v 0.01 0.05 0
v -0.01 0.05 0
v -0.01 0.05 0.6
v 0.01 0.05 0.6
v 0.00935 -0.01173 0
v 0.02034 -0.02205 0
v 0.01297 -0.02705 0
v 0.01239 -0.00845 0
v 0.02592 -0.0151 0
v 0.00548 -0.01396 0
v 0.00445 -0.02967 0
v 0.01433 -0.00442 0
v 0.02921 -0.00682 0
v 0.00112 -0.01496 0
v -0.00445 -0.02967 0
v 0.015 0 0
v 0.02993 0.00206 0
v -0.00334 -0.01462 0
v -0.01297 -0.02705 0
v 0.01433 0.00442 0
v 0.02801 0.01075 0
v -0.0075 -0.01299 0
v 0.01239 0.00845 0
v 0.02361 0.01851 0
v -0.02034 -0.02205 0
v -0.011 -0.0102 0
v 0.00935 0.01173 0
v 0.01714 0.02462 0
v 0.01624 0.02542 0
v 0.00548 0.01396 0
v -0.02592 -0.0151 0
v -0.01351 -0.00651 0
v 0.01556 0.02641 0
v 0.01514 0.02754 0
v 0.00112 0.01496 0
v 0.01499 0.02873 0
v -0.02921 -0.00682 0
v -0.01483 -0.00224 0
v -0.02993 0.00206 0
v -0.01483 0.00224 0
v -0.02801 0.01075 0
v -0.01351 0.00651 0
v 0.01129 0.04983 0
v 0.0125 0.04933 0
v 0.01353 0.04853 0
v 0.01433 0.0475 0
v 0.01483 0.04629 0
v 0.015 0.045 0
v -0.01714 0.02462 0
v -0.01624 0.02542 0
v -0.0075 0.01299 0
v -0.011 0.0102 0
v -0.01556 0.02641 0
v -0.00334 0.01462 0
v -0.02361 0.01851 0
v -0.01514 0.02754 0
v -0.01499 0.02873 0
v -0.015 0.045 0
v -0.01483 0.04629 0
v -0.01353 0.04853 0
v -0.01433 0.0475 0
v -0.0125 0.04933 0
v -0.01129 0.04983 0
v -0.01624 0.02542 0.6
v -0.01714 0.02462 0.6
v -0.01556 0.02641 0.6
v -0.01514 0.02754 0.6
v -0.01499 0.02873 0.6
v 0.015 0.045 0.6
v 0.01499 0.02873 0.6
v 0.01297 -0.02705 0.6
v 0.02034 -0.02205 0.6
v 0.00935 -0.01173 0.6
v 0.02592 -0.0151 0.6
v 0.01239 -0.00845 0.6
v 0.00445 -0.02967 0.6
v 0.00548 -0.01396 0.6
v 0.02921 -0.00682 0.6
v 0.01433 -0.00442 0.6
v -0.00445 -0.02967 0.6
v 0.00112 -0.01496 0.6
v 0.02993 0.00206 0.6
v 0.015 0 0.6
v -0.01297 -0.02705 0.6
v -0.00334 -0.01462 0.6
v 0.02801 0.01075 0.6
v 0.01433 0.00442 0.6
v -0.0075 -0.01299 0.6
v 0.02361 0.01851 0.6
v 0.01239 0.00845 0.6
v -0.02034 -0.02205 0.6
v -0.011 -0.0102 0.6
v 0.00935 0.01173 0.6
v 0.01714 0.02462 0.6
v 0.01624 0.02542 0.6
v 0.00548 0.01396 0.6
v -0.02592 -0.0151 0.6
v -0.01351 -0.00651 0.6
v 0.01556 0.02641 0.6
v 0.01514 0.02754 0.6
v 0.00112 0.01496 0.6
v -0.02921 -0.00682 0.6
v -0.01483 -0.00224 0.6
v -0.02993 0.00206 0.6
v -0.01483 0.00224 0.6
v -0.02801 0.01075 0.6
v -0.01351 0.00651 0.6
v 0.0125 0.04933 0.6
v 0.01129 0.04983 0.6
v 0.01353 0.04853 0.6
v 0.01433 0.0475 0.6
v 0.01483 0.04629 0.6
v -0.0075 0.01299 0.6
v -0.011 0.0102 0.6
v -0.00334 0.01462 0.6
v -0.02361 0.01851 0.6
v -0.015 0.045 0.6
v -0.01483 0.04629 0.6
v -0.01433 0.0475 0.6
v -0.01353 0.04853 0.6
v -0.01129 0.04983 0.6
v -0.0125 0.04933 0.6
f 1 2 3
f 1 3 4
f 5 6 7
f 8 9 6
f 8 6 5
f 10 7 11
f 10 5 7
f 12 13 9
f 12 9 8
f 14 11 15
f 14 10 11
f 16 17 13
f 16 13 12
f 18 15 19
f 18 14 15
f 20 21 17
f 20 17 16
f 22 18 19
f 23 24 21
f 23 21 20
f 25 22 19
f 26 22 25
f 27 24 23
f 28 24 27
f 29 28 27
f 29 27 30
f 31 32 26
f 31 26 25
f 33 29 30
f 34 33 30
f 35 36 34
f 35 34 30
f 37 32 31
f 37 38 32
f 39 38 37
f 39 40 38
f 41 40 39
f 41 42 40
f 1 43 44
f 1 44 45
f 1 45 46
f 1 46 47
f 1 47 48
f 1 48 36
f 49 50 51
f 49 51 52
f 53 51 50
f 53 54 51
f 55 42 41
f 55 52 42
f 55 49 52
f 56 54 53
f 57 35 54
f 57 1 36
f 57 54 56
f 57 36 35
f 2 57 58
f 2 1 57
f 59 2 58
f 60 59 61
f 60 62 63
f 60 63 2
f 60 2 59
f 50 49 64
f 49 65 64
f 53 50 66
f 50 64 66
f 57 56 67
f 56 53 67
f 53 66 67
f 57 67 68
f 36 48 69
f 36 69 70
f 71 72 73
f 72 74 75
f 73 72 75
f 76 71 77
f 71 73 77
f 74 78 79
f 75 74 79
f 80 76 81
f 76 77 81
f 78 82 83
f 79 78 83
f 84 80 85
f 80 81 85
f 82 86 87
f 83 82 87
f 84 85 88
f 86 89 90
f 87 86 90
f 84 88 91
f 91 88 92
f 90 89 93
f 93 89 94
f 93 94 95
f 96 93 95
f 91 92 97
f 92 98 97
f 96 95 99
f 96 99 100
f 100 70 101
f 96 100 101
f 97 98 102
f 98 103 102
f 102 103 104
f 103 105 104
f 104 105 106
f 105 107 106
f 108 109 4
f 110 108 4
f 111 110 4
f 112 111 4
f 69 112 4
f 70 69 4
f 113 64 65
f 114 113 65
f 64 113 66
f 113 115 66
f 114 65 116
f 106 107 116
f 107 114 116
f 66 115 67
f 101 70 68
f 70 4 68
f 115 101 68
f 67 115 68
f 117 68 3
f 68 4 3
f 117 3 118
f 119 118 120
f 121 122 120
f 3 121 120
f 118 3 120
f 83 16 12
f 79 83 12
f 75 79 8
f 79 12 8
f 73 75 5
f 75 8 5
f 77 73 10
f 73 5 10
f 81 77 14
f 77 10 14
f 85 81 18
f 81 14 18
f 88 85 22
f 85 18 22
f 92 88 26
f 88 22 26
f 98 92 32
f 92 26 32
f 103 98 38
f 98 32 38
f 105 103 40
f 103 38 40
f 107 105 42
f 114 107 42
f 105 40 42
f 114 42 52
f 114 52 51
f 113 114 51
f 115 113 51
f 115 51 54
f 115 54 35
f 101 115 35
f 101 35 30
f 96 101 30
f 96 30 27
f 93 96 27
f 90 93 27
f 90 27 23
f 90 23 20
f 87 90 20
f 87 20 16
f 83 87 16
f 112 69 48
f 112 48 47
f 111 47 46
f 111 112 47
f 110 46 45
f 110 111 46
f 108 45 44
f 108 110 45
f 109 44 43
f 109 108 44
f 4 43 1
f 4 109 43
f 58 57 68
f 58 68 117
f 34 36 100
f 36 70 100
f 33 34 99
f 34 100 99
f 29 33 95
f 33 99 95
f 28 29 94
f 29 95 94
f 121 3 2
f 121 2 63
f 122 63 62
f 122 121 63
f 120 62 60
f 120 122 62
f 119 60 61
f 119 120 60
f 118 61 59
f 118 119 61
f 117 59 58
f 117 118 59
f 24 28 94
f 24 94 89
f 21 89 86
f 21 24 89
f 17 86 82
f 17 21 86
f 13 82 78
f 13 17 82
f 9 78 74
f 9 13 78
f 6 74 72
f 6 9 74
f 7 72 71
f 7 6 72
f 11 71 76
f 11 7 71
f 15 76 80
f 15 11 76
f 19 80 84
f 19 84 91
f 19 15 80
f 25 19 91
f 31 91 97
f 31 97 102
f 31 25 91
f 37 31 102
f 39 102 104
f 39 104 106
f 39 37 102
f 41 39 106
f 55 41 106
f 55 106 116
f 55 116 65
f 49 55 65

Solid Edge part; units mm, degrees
sketch "Sketch1" plane through (0, 0, 0) normal (0, 0, 1) x (1, 0, 0)
  line L0 (-0.015, 0.026) -> (-0.015, 0.05)
  line L1 (-0.015, 0.05) -> (0.015, 0.05)
  line L2 (0.015, 0.05) -> (0.015, 0.026)
  arc A0 (0.015, 0.026) -> (-0.015, 0.026) centre (0, 0) cw
  dimension "D1" = 0.015
extrude "Protrusion1" add sketch "Sketch1" along normal blind 0.6
sketch "Sketch2" plane through (0, 0, 0) normal (0, 0, 1) x (1, 0, 0)
  circle A0 centre (0, 0) radius 0.015
  dimension "D1" = 0.03
extrude "Cutout1" cut sketch "Sketch2" along normal through all
fillet "Verrundung_1" radius 0.005 4 edges at (0.015, 0.026, 0.3) (0.015, 0.05, 0.3) (-0.015, 0.026, 0.3) (-0.015, 0.05, 0.3)
